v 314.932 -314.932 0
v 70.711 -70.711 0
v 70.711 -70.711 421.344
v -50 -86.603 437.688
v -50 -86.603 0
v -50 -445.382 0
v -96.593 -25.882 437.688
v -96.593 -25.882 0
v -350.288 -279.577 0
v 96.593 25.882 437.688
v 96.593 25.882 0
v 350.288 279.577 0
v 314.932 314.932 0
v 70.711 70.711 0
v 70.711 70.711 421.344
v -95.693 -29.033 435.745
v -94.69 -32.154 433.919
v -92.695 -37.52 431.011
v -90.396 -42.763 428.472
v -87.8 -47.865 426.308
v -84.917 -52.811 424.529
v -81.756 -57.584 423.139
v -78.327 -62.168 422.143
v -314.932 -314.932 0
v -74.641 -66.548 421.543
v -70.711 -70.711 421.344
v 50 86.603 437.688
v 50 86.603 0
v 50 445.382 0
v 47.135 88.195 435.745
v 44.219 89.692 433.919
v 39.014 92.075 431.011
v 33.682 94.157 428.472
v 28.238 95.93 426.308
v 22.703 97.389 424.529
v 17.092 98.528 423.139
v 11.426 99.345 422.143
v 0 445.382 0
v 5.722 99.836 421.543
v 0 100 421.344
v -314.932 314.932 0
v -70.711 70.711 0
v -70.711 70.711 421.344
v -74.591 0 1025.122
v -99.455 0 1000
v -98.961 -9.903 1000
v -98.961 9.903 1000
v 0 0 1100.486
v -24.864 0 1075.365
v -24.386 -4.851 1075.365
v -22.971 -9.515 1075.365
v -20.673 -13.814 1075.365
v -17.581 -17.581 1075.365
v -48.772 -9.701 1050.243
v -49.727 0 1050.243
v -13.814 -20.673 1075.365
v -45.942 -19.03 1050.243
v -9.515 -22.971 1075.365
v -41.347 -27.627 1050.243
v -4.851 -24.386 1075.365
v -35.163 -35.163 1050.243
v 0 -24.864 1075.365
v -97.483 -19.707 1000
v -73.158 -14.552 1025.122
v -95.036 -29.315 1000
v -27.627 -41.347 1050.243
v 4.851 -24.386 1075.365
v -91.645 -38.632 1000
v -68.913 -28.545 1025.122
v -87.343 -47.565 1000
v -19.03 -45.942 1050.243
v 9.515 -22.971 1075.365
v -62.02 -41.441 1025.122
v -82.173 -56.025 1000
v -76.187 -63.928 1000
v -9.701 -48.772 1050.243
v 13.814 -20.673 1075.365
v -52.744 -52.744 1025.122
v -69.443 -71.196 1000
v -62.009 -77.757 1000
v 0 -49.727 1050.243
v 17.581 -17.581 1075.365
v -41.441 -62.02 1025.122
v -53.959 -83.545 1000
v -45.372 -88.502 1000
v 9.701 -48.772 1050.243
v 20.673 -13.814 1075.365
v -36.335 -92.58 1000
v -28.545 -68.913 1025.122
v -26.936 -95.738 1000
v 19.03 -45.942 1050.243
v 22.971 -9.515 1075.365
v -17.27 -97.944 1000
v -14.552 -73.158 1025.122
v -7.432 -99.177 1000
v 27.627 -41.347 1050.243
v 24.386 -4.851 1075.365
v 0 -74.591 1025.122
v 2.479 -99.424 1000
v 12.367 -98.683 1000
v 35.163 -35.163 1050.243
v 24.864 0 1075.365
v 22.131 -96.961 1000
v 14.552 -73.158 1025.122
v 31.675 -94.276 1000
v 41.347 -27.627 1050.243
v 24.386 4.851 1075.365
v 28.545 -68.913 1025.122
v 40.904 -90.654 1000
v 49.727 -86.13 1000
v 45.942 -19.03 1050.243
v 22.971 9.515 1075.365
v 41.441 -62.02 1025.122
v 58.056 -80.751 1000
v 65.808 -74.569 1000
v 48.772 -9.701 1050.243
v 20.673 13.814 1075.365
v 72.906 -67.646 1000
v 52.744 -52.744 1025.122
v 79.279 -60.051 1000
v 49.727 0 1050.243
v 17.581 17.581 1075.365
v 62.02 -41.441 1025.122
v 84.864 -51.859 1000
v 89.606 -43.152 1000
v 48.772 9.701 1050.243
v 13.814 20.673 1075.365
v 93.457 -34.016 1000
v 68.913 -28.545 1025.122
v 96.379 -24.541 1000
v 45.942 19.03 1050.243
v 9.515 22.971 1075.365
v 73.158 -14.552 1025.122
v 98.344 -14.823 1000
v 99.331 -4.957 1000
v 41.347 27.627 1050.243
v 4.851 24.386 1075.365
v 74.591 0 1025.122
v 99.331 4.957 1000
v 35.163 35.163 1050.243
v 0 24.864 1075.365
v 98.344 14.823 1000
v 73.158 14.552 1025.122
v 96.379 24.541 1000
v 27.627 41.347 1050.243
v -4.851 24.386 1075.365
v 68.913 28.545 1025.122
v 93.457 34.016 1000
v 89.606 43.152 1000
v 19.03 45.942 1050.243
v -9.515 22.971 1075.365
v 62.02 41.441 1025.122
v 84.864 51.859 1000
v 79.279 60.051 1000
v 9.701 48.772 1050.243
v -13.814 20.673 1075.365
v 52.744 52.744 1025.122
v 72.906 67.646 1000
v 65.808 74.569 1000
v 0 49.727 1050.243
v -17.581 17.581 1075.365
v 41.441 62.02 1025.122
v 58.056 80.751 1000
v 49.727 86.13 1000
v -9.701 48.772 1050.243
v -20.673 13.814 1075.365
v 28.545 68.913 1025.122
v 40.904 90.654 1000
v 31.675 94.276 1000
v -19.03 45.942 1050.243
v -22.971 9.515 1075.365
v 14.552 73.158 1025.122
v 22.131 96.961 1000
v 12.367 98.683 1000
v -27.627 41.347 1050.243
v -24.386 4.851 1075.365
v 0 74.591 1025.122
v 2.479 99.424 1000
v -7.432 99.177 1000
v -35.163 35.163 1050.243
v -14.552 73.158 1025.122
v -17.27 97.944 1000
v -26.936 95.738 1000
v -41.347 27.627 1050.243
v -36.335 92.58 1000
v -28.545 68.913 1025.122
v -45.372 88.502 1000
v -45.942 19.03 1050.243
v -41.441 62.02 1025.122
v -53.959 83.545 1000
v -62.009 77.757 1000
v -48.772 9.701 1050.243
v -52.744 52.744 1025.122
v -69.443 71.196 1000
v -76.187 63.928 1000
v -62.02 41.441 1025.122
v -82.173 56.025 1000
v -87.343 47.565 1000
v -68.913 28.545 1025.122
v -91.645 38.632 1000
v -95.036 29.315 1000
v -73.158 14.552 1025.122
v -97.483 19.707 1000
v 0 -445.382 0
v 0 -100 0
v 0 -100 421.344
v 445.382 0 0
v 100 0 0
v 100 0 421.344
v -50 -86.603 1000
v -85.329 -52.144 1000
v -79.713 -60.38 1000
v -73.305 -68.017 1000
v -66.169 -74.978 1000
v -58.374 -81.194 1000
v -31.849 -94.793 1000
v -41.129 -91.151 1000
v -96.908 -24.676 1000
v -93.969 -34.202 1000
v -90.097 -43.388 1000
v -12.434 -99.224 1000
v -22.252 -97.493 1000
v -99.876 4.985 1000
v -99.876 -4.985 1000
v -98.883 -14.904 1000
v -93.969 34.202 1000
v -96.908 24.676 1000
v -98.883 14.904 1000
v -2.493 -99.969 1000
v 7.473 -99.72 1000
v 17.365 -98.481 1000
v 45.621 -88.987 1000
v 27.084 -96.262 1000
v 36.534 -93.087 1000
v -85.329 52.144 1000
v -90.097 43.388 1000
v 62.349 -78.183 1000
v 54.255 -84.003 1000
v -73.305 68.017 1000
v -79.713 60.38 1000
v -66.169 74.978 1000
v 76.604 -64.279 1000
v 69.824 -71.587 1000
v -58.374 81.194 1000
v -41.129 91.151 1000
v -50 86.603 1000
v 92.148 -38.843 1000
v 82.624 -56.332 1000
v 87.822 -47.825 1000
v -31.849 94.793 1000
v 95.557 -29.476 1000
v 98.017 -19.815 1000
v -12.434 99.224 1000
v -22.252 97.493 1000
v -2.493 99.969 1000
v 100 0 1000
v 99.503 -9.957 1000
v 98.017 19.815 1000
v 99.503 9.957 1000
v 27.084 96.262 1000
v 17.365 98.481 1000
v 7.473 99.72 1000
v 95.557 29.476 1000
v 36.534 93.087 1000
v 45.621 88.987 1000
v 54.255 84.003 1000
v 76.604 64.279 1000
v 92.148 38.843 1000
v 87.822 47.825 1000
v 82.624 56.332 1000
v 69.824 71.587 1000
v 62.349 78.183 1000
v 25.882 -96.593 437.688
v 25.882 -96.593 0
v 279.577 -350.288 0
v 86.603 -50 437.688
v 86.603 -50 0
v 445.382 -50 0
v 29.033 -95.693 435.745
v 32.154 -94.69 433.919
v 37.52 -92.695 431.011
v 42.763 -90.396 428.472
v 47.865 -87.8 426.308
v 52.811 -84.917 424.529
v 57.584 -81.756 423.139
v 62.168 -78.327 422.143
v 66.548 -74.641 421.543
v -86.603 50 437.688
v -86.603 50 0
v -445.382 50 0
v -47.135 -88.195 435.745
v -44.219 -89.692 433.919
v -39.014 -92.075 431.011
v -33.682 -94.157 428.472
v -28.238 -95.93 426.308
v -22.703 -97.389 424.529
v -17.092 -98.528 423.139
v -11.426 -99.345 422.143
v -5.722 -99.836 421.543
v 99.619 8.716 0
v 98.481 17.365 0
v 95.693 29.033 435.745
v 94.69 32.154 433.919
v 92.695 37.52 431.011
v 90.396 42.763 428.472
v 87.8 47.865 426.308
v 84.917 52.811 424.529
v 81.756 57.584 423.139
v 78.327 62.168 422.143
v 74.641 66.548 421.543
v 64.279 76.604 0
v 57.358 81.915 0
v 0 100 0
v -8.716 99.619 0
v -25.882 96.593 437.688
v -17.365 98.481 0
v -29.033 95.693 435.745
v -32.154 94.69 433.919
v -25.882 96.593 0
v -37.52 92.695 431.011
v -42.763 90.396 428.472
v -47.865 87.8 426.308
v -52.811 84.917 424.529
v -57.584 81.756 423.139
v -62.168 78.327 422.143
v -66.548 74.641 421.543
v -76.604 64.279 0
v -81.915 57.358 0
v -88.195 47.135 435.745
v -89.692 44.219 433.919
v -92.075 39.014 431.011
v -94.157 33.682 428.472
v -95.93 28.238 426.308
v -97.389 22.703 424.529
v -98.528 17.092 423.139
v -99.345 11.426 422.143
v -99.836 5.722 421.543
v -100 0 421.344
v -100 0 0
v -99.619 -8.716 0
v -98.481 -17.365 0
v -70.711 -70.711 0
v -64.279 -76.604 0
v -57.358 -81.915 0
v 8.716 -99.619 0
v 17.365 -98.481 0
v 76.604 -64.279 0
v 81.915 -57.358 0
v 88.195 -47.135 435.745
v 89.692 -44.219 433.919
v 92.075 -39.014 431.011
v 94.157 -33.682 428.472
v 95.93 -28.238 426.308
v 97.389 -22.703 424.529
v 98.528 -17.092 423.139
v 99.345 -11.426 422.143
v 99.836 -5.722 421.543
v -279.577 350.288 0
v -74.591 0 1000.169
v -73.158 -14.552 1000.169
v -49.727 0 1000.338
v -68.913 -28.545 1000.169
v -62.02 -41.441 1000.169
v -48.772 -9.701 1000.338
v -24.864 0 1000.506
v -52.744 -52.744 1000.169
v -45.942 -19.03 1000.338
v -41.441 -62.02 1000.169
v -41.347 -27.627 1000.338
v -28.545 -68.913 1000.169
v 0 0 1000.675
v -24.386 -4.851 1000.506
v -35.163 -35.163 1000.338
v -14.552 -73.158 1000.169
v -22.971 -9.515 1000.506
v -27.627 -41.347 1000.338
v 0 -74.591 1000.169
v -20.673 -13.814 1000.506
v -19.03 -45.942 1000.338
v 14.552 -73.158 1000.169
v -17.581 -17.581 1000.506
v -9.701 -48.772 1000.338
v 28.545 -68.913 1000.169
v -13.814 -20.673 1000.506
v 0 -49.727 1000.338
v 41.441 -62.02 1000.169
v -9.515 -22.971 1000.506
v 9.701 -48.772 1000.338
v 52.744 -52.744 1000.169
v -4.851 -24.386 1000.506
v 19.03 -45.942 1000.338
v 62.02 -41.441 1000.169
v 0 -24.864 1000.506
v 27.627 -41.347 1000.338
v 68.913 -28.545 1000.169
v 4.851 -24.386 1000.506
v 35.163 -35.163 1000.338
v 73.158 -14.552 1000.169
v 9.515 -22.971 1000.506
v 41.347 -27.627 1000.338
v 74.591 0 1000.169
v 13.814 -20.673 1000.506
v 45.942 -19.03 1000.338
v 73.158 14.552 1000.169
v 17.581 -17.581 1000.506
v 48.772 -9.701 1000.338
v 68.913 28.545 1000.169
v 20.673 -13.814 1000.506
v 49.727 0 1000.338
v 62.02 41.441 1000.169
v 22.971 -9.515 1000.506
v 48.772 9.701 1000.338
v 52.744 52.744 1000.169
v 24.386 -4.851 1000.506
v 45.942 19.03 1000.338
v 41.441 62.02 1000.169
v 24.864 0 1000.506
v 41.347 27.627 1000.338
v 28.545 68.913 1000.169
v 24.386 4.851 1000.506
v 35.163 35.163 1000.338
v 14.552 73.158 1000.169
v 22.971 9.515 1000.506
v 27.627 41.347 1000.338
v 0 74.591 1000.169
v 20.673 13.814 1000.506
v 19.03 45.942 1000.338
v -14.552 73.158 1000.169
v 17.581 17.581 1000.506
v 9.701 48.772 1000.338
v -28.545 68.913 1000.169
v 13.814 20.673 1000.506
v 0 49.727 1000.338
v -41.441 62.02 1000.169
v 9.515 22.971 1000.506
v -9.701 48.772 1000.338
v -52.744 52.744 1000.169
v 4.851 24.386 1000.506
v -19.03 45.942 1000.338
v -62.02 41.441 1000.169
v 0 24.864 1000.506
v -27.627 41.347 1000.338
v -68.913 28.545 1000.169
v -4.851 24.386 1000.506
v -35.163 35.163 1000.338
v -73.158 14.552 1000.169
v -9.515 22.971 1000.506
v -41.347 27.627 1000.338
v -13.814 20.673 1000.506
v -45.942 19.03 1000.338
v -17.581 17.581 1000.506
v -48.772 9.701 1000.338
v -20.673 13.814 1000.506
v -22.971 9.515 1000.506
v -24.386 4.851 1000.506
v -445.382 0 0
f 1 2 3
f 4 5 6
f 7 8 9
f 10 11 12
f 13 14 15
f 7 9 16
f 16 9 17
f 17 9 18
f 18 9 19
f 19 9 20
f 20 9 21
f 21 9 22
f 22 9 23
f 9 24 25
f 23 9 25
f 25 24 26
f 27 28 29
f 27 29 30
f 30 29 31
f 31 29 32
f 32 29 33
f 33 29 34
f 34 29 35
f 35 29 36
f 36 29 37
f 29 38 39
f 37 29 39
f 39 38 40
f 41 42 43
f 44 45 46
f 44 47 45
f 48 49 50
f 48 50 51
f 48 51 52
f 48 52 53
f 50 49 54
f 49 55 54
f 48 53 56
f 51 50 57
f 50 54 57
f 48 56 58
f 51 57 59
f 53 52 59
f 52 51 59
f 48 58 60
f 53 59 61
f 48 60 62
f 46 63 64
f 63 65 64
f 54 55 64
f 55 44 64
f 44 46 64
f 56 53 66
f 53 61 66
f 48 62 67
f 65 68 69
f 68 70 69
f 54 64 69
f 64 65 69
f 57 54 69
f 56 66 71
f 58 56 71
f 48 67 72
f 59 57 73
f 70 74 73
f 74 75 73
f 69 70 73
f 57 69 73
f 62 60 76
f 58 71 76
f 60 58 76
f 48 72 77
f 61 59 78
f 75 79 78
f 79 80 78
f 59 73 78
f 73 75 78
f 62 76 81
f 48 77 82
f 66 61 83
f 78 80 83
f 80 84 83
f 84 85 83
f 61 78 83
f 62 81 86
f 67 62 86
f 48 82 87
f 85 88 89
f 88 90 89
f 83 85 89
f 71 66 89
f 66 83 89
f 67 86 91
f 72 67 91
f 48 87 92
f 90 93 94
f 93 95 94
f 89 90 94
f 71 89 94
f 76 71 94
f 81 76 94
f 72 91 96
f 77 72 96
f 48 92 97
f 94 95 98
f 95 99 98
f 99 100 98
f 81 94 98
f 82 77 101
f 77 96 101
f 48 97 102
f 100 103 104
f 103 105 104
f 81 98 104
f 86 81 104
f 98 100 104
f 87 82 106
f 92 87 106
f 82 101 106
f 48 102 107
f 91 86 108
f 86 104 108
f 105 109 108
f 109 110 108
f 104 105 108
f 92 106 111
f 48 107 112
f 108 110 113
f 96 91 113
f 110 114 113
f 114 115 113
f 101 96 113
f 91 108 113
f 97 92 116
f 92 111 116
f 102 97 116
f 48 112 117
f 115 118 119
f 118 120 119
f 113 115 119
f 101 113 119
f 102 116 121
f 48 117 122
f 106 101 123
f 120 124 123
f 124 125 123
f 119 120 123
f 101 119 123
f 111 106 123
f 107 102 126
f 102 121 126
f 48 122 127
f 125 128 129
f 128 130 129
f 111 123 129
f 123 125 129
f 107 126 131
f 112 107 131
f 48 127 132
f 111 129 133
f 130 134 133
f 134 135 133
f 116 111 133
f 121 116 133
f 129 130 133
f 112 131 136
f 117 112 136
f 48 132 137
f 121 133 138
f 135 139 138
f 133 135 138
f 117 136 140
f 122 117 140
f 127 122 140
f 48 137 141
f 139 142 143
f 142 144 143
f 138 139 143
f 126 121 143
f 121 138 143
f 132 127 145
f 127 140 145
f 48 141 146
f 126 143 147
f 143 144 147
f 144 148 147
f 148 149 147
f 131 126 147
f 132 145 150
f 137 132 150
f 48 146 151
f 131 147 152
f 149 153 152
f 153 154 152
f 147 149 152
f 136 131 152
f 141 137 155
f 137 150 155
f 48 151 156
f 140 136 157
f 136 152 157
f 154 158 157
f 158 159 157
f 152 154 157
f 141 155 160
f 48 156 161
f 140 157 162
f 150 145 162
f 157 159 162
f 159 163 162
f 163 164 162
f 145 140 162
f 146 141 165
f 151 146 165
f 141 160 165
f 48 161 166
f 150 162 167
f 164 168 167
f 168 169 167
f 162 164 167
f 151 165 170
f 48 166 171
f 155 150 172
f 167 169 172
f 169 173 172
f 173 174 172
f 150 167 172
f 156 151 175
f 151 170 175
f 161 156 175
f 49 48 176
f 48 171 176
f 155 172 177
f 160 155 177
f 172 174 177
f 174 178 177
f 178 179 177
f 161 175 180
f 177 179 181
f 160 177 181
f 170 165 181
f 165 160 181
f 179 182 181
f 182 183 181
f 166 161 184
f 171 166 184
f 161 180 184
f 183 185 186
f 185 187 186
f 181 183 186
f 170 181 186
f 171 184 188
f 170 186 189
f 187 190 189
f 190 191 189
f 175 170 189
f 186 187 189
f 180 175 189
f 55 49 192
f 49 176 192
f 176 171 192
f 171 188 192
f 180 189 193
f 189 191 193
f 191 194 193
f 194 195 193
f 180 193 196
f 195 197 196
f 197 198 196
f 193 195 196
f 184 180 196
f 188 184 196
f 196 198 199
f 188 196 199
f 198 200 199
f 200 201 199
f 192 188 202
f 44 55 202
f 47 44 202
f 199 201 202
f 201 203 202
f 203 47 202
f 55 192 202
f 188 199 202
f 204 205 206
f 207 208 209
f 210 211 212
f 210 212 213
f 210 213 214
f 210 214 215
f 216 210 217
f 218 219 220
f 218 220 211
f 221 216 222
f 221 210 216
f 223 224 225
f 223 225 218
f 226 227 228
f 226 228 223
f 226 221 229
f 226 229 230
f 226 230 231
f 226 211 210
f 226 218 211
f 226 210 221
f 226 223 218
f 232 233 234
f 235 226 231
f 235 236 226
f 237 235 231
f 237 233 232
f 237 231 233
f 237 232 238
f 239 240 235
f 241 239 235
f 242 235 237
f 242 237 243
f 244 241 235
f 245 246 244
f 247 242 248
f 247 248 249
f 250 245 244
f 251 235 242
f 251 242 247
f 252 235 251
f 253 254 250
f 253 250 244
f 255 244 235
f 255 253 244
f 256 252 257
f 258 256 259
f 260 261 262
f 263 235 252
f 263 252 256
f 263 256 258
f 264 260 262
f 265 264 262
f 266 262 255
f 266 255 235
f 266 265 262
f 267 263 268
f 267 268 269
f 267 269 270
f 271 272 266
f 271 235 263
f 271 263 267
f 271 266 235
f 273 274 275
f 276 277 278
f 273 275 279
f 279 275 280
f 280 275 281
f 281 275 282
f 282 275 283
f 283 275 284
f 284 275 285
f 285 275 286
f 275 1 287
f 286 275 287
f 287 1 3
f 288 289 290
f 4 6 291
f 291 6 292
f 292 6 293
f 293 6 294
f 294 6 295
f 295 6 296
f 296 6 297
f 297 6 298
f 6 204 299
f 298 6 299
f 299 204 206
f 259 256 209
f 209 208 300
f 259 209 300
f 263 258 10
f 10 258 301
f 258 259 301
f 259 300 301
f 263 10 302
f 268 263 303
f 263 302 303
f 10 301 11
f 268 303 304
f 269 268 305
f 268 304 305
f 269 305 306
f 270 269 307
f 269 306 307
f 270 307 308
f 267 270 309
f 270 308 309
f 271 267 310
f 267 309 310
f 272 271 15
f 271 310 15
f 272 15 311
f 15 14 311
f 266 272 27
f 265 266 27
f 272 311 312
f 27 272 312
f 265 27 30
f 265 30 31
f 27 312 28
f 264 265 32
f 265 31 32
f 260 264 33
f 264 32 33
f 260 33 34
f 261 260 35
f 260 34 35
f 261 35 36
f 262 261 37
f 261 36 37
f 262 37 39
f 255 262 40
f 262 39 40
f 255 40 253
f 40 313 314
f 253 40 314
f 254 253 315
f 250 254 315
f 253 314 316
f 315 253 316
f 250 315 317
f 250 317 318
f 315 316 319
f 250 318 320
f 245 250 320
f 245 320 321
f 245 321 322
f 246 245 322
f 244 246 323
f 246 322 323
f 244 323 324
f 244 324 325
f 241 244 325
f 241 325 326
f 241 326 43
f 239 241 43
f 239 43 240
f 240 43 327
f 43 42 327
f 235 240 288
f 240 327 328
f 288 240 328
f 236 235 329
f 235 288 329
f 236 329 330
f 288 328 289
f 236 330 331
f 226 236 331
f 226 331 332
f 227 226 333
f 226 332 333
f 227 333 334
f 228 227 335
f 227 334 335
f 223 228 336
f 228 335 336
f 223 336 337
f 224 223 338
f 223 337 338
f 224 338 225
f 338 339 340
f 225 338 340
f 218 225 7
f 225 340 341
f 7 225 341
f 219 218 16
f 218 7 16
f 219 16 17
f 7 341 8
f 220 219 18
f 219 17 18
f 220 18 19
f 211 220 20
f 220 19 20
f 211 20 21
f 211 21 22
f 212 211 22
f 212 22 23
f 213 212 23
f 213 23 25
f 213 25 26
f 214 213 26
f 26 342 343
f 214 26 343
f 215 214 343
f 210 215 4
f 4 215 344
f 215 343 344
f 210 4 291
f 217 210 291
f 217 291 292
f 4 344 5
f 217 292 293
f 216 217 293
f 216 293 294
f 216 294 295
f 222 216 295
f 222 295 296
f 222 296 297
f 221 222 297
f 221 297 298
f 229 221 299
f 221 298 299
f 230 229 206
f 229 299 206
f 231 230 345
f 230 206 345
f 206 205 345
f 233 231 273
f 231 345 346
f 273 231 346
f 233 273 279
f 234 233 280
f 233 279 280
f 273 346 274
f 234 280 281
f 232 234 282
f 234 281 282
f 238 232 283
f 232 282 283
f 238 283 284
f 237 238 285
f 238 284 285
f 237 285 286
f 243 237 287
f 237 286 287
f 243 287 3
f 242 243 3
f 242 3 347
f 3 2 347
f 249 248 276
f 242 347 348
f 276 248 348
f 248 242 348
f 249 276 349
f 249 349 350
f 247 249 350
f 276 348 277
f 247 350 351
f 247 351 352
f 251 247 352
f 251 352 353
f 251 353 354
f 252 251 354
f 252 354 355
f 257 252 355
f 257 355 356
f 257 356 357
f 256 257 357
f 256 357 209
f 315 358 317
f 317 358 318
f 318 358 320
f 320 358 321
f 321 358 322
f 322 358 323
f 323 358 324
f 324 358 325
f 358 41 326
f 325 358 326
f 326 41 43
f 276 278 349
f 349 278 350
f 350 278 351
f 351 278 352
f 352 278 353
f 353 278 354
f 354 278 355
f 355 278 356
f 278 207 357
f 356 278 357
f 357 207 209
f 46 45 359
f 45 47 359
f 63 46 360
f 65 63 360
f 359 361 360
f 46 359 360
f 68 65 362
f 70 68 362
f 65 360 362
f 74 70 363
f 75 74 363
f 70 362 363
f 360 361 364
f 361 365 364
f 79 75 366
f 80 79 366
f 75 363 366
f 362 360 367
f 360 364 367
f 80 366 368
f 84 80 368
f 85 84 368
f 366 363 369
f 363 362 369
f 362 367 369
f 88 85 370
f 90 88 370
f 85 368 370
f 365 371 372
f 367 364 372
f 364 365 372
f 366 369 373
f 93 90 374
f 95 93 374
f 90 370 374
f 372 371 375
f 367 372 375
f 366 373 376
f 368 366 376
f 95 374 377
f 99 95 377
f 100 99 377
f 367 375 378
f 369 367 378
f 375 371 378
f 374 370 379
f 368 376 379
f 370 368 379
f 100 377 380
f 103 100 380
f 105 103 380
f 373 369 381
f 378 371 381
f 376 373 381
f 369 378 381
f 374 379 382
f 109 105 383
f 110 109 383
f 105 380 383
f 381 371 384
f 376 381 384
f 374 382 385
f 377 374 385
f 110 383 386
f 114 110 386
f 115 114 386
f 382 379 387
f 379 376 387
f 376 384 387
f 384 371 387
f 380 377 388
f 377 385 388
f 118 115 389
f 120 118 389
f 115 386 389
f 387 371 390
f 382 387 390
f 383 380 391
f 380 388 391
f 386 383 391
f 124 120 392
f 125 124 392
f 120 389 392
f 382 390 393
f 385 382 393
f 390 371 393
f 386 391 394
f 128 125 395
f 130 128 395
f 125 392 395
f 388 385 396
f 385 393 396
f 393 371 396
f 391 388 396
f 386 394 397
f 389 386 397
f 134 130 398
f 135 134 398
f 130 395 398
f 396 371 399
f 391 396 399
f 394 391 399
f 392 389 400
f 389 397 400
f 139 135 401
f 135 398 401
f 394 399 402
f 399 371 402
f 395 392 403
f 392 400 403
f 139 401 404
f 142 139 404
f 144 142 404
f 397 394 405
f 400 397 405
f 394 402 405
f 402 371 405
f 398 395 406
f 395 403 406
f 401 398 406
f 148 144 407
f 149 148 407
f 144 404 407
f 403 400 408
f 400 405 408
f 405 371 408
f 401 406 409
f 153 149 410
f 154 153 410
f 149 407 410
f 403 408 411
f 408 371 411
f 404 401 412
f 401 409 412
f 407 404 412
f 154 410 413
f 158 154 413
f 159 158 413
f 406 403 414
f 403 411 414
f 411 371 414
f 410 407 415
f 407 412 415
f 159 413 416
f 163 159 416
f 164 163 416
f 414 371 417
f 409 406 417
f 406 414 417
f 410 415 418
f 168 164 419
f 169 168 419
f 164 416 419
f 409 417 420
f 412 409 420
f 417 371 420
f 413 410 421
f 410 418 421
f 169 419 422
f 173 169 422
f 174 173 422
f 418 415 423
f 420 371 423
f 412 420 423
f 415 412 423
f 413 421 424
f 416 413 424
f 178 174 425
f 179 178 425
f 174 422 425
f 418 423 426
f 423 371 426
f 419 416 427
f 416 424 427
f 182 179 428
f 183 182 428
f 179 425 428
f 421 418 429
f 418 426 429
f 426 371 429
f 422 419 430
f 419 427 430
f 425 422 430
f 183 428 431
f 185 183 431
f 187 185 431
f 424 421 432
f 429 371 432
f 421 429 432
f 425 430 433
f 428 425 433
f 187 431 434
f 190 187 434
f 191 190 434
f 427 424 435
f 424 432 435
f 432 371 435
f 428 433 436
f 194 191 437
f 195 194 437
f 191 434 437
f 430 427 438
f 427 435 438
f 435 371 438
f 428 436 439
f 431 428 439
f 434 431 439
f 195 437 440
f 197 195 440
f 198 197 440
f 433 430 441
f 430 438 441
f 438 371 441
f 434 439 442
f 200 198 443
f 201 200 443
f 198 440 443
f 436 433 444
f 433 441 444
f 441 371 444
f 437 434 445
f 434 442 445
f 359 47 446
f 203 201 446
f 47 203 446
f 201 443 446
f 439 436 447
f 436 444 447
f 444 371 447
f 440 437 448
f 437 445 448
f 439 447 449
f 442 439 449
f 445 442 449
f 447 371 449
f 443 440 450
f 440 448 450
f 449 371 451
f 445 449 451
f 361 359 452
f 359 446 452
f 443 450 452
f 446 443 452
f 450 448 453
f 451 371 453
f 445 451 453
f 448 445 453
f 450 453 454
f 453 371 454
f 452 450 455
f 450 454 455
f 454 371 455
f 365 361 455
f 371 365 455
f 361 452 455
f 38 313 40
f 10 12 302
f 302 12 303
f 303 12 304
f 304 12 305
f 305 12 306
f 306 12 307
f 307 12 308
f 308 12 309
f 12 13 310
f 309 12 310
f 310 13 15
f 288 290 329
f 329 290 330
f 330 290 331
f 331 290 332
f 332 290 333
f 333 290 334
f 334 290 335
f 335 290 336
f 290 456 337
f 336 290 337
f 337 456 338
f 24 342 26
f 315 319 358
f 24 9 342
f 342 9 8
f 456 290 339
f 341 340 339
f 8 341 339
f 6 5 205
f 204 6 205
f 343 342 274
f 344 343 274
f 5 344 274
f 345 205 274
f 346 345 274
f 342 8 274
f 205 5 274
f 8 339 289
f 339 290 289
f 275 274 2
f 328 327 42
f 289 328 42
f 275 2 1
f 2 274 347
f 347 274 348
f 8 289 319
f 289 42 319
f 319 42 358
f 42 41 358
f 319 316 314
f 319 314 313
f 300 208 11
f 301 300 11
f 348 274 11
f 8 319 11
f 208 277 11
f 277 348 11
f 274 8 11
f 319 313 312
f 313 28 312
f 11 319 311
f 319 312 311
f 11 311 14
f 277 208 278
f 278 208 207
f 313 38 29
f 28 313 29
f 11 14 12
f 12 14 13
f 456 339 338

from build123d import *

# Parameters (mm, degrees)
F0_R            = 100
F1_DEPTH        = 1000
F3_DEPTH        = 50
F3_COPIES_COUNT = 8


# Not quite as in the source:
# - a pattern or mirror of a feature is missing from the dataset's text; its kind, count and spacing are read off the source's solid


with BuildPart() as f1:
    # F0 (on Top) → F1 (new body)
    with BuildSketch(Plane.XY):
        Circle(F0_R)
    extrude(amount=F1_DEPTH)

    # F2 (on Right) → F3 (join)
    with BuildSketch(Plane.YZ):
        Polygon((0, 543.3371663094), (0, 0), (445.3816711903, 0), align=None)
    f3 = extrude(amount=F3_DEPTH)

    # F3_copies: F3 ×8 about axis
    f3_copies_axis = Axis((0, 0, 0), (0, 0, 1))
    for i in range(1, F3_COPIES_COUNT):
        add(f3.rotate(f3_copies_axis, i * 360 / F3_COPIES_COUNT))


with BuildPart() as f5:
    # F4 (on Front) → F5 (revolve)
    with BuildSketch(Plane.XZ):
        Polygon((0, 1100.4860401154), (-99.4548052549, 1000.0003576279), (0, 1000.6748437881), align=None)
    revolve(axis=Axis((0, 0, 1000), (0, 0, 1)))


solid = Compound([f1.part, f5.part])
